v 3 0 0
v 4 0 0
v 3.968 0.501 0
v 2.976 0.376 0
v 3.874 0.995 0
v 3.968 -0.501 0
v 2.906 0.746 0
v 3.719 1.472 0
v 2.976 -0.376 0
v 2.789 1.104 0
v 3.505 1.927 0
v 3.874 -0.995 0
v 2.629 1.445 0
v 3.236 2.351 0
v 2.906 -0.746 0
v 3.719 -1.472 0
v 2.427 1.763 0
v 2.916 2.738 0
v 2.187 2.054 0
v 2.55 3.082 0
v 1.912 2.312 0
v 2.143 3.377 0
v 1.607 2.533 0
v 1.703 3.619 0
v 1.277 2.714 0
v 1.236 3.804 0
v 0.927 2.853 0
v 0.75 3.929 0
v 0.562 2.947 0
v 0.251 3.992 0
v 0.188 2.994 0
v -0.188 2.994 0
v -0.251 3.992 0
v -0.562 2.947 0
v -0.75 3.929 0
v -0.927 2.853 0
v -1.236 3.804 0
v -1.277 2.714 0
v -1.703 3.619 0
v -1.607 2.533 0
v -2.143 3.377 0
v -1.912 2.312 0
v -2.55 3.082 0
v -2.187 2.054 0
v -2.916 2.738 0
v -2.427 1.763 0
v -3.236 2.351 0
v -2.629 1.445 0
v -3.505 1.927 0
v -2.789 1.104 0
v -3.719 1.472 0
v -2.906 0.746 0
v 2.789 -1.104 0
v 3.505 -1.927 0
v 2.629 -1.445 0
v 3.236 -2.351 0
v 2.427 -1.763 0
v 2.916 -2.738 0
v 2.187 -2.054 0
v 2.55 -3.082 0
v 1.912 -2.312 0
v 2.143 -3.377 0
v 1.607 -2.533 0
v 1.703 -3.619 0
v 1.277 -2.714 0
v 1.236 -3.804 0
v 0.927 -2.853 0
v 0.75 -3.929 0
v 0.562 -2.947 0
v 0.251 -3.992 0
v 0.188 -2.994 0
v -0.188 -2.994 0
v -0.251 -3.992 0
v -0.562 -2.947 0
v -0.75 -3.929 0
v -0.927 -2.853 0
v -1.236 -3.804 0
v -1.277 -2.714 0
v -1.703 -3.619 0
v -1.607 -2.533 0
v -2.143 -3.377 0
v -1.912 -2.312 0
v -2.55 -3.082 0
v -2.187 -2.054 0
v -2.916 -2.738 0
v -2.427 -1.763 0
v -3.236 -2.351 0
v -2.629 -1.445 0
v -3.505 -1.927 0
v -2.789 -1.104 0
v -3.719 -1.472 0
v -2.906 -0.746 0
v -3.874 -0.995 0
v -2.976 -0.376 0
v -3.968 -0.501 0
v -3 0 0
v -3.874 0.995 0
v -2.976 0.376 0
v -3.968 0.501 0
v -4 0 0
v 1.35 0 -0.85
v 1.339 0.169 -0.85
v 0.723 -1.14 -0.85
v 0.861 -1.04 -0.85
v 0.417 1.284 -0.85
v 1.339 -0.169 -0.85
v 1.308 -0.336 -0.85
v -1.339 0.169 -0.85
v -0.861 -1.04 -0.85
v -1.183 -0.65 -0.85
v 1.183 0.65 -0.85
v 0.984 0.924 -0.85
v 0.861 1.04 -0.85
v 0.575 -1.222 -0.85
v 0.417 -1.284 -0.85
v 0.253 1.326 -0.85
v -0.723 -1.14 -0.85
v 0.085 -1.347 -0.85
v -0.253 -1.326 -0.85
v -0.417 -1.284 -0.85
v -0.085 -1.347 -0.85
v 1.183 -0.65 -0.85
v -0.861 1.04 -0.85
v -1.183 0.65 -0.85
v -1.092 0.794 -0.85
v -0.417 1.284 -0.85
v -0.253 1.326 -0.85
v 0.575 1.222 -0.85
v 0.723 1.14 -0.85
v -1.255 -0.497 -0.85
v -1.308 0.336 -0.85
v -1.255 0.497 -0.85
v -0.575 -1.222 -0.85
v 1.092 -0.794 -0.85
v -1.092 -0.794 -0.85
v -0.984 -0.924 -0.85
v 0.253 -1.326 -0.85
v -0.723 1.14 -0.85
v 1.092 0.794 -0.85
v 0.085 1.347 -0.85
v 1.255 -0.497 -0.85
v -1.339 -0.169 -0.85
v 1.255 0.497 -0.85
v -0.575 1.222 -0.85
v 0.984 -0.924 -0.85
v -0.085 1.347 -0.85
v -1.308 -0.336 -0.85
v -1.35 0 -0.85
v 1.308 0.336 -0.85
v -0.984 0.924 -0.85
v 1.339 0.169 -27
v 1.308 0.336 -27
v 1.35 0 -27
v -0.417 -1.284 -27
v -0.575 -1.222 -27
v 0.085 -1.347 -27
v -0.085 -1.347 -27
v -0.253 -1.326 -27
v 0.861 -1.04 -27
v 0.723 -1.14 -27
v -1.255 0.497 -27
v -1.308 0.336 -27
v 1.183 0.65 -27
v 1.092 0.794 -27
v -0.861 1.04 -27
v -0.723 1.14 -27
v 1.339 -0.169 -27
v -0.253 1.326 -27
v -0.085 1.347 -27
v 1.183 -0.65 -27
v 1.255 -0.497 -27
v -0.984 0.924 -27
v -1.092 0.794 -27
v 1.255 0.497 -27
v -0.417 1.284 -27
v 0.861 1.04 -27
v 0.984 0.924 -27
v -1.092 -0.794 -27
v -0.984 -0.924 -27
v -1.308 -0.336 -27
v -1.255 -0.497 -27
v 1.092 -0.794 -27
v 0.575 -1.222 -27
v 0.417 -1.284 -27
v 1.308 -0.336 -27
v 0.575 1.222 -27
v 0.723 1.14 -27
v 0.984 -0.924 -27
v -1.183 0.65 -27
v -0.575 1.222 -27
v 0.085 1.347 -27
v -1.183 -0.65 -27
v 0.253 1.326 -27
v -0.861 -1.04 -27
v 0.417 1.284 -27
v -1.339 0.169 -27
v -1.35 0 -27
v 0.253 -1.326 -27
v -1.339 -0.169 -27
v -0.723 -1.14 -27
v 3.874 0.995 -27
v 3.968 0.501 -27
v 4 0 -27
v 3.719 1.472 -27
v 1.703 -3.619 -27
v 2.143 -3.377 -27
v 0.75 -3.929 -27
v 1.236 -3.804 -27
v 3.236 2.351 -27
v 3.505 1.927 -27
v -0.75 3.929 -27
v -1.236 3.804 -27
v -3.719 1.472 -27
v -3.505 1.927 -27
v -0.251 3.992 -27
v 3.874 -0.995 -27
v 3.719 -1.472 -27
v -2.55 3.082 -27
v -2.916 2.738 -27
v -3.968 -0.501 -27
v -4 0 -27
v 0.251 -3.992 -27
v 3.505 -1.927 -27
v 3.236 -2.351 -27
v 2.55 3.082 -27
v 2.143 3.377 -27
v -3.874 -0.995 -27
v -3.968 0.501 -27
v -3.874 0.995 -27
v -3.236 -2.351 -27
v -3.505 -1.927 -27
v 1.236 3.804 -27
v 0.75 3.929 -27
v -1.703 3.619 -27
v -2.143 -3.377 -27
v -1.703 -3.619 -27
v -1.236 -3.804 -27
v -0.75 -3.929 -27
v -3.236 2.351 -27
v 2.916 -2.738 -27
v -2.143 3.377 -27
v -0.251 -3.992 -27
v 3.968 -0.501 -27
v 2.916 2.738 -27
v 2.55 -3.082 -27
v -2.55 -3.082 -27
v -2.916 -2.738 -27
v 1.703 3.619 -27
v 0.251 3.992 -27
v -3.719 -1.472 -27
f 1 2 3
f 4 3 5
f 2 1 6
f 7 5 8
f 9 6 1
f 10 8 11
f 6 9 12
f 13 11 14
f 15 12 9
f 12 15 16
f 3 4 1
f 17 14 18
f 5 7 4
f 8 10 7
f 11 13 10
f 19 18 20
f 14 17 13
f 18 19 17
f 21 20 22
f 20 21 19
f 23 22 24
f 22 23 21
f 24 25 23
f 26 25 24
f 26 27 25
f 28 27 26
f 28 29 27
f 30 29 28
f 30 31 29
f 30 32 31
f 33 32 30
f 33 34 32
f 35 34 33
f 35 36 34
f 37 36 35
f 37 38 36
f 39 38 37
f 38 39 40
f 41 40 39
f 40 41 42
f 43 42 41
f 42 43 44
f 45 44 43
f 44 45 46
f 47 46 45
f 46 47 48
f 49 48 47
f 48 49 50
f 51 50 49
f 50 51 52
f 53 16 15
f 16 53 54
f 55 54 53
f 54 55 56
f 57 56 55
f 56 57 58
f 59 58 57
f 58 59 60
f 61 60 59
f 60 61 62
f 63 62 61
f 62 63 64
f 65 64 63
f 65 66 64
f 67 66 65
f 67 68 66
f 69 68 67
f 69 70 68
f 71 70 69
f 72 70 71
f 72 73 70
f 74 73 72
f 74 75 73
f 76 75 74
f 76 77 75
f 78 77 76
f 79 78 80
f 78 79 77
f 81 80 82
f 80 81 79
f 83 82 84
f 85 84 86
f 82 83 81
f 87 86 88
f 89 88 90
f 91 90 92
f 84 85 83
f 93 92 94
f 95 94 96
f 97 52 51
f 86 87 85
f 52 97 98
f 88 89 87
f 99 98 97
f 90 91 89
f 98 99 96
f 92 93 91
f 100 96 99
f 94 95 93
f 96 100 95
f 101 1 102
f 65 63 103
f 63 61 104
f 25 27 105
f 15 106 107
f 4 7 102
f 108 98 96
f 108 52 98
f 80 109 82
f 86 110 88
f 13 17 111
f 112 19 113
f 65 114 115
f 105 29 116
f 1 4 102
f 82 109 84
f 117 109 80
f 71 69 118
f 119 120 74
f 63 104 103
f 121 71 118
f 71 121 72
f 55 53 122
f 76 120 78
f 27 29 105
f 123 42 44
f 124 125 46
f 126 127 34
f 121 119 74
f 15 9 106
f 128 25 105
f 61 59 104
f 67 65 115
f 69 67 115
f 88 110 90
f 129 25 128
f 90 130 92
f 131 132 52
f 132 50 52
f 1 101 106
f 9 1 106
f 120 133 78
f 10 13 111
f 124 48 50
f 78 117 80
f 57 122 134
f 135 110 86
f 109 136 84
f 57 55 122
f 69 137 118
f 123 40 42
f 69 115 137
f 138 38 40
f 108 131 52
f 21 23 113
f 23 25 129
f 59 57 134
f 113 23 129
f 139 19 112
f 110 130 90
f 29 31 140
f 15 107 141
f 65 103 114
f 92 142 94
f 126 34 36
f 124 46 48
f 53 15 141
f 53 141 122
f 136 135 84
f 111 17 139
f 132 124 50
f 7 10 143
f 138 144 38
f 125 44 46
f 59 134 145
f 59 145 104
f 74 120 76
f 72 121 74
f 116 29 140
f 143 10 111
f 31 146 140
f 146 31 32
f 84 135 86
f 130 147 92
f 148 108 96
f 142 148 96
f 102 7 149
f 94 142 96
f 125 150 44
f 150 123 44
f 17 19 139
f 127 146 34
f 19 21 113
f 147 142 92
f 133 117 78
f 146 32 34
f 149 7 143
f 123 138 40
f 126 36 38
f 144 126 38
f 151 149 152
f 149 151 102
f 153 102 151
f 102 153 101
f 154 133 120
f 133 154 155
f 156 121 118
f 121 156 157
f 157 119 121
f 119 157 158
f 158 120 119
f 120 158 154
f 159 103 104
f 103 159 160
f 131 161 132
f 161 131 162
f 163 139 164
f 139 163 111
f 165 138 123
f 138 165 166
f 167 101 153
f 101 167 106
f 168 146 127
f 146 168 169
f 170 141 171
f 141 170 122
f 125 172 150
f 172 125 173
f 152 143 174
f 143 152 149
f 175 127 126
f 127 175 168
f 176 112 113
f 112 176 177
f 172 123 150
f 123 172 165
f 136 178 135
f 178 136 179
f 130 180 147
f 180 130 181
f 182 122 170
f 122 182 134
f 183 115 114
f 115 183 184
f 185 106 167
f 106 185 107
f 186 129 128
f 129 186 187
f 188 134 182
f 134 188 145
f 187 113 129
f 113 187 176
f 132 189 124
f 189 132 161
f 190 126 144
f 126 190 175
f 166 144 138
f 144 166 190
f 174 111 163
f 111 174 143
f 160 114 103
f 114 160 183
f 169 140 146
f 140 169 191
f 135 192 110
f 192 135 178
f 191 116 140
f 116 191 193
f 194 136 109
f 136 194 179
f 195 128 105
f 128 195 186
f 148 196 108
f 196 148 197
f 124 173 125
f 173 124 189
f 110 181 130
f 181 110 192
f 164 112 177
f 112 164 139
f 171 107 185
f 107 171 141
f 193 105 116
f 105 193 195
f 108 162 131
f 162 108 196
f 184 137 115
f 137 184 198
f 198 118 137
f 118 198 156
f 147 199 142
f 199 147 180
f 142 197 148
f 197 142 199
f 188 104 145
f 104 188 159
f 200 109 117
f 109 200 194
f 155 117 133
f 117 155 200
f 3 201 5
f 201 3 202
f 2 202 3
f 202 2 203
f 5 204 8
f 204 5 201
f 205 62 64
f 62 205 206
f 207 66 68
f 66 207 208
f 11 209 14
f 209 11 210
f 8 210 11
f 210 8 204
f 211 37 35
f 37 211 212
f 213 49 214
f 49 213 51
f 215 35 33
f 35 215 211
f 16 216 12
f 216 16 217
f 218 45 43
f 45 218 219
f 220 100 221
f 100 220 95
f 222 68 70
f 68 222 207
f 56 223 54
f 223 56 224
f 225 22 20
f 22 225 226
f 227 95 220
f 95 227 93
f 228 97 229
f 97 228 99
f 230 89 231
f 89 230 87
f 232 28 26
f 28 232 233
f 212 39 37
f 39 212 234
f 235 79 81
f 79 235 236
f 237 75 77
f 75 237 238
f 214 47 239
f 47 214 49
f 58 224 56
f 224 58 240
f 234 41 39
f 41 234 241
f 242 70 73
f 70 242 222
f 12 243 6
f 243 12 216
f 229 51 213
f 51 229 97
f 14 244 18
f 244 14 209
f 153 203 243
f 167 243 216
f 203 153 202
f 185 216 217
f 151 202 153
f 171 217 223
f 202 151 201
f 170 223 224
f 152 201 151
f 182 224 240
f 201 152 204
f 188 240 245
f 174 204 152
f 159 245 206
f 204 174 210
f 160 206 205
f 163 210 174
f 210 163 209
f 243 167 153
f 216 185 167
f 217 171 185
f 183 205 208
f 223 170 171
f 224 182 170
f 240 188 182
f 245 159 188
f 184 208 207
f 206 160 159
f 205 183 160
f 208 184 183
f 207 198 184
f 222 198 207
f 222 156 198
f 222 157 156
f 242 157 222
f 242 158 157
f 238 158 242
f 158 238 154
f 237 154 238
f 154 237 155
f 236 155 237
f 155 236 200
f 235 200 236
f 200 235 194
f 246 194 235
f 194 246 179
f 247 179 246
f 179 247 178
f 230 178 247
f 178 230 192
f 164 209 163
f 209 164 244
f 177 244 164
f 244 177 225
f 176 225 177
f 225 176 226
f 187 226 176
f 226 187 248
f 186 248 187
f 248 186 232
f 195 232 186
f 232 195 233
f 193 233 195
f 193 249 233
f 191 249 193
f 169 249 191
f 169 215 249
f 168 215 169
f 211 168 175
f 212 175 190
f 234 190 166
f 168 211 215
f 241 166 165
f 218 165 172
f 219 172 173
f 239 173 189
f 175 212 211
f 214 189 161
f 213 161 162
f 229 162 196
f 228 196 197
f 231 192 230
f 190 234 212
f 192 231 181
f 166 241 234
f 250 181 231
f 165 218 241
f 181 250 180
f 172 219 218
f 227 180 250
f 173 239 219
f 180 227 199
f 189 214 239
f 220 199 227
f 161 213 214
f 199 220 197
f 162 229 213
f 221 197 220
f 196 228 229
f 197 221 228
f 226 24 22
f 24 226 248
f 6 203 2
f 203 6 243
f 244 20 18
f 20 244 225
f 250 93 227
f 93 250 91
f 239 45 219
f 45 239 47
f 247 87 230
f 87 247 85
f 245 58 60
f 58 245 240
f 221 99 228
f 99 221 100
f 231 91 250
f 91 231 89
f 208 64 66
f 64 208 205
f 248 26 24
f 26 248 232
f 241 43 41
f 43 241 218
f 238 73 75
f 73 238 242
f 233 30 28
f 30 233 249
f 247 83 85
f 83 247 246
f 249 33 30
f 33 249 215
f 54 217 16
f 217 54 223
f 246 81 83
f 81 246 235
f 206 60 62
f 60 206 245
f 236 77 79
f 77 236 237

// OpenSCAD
$fn = 50;

difference() {
	union() {
		translate(v = [0, 0, -27.0]) {
			cylinder(h = 27, r = 4.0);
		}
	}
	union() {
		translate(v = [0, 0, 0]) {
			rotate(a = [0, 0, 0]) {
				difference() {
					union() {
						translate(v = [0, 0, -30.0]) {
							cylinder(h = 30, r = 1.0);
						}
						translate(v = [0, 0, -0.85]) {
							cylinder(h = 0.85, r1 = 1.35, r2 = 3.0);
						}
						translate(v = [0, 0, -30.0]) {
							cylinder(h = 30, r = 1.35);
						}
						translate(v = [0, 0, -30.0]) {
							cylinder(h = 30, r = 1.0);
						}
					}
					union();
				}
			}
		}
	}
}
